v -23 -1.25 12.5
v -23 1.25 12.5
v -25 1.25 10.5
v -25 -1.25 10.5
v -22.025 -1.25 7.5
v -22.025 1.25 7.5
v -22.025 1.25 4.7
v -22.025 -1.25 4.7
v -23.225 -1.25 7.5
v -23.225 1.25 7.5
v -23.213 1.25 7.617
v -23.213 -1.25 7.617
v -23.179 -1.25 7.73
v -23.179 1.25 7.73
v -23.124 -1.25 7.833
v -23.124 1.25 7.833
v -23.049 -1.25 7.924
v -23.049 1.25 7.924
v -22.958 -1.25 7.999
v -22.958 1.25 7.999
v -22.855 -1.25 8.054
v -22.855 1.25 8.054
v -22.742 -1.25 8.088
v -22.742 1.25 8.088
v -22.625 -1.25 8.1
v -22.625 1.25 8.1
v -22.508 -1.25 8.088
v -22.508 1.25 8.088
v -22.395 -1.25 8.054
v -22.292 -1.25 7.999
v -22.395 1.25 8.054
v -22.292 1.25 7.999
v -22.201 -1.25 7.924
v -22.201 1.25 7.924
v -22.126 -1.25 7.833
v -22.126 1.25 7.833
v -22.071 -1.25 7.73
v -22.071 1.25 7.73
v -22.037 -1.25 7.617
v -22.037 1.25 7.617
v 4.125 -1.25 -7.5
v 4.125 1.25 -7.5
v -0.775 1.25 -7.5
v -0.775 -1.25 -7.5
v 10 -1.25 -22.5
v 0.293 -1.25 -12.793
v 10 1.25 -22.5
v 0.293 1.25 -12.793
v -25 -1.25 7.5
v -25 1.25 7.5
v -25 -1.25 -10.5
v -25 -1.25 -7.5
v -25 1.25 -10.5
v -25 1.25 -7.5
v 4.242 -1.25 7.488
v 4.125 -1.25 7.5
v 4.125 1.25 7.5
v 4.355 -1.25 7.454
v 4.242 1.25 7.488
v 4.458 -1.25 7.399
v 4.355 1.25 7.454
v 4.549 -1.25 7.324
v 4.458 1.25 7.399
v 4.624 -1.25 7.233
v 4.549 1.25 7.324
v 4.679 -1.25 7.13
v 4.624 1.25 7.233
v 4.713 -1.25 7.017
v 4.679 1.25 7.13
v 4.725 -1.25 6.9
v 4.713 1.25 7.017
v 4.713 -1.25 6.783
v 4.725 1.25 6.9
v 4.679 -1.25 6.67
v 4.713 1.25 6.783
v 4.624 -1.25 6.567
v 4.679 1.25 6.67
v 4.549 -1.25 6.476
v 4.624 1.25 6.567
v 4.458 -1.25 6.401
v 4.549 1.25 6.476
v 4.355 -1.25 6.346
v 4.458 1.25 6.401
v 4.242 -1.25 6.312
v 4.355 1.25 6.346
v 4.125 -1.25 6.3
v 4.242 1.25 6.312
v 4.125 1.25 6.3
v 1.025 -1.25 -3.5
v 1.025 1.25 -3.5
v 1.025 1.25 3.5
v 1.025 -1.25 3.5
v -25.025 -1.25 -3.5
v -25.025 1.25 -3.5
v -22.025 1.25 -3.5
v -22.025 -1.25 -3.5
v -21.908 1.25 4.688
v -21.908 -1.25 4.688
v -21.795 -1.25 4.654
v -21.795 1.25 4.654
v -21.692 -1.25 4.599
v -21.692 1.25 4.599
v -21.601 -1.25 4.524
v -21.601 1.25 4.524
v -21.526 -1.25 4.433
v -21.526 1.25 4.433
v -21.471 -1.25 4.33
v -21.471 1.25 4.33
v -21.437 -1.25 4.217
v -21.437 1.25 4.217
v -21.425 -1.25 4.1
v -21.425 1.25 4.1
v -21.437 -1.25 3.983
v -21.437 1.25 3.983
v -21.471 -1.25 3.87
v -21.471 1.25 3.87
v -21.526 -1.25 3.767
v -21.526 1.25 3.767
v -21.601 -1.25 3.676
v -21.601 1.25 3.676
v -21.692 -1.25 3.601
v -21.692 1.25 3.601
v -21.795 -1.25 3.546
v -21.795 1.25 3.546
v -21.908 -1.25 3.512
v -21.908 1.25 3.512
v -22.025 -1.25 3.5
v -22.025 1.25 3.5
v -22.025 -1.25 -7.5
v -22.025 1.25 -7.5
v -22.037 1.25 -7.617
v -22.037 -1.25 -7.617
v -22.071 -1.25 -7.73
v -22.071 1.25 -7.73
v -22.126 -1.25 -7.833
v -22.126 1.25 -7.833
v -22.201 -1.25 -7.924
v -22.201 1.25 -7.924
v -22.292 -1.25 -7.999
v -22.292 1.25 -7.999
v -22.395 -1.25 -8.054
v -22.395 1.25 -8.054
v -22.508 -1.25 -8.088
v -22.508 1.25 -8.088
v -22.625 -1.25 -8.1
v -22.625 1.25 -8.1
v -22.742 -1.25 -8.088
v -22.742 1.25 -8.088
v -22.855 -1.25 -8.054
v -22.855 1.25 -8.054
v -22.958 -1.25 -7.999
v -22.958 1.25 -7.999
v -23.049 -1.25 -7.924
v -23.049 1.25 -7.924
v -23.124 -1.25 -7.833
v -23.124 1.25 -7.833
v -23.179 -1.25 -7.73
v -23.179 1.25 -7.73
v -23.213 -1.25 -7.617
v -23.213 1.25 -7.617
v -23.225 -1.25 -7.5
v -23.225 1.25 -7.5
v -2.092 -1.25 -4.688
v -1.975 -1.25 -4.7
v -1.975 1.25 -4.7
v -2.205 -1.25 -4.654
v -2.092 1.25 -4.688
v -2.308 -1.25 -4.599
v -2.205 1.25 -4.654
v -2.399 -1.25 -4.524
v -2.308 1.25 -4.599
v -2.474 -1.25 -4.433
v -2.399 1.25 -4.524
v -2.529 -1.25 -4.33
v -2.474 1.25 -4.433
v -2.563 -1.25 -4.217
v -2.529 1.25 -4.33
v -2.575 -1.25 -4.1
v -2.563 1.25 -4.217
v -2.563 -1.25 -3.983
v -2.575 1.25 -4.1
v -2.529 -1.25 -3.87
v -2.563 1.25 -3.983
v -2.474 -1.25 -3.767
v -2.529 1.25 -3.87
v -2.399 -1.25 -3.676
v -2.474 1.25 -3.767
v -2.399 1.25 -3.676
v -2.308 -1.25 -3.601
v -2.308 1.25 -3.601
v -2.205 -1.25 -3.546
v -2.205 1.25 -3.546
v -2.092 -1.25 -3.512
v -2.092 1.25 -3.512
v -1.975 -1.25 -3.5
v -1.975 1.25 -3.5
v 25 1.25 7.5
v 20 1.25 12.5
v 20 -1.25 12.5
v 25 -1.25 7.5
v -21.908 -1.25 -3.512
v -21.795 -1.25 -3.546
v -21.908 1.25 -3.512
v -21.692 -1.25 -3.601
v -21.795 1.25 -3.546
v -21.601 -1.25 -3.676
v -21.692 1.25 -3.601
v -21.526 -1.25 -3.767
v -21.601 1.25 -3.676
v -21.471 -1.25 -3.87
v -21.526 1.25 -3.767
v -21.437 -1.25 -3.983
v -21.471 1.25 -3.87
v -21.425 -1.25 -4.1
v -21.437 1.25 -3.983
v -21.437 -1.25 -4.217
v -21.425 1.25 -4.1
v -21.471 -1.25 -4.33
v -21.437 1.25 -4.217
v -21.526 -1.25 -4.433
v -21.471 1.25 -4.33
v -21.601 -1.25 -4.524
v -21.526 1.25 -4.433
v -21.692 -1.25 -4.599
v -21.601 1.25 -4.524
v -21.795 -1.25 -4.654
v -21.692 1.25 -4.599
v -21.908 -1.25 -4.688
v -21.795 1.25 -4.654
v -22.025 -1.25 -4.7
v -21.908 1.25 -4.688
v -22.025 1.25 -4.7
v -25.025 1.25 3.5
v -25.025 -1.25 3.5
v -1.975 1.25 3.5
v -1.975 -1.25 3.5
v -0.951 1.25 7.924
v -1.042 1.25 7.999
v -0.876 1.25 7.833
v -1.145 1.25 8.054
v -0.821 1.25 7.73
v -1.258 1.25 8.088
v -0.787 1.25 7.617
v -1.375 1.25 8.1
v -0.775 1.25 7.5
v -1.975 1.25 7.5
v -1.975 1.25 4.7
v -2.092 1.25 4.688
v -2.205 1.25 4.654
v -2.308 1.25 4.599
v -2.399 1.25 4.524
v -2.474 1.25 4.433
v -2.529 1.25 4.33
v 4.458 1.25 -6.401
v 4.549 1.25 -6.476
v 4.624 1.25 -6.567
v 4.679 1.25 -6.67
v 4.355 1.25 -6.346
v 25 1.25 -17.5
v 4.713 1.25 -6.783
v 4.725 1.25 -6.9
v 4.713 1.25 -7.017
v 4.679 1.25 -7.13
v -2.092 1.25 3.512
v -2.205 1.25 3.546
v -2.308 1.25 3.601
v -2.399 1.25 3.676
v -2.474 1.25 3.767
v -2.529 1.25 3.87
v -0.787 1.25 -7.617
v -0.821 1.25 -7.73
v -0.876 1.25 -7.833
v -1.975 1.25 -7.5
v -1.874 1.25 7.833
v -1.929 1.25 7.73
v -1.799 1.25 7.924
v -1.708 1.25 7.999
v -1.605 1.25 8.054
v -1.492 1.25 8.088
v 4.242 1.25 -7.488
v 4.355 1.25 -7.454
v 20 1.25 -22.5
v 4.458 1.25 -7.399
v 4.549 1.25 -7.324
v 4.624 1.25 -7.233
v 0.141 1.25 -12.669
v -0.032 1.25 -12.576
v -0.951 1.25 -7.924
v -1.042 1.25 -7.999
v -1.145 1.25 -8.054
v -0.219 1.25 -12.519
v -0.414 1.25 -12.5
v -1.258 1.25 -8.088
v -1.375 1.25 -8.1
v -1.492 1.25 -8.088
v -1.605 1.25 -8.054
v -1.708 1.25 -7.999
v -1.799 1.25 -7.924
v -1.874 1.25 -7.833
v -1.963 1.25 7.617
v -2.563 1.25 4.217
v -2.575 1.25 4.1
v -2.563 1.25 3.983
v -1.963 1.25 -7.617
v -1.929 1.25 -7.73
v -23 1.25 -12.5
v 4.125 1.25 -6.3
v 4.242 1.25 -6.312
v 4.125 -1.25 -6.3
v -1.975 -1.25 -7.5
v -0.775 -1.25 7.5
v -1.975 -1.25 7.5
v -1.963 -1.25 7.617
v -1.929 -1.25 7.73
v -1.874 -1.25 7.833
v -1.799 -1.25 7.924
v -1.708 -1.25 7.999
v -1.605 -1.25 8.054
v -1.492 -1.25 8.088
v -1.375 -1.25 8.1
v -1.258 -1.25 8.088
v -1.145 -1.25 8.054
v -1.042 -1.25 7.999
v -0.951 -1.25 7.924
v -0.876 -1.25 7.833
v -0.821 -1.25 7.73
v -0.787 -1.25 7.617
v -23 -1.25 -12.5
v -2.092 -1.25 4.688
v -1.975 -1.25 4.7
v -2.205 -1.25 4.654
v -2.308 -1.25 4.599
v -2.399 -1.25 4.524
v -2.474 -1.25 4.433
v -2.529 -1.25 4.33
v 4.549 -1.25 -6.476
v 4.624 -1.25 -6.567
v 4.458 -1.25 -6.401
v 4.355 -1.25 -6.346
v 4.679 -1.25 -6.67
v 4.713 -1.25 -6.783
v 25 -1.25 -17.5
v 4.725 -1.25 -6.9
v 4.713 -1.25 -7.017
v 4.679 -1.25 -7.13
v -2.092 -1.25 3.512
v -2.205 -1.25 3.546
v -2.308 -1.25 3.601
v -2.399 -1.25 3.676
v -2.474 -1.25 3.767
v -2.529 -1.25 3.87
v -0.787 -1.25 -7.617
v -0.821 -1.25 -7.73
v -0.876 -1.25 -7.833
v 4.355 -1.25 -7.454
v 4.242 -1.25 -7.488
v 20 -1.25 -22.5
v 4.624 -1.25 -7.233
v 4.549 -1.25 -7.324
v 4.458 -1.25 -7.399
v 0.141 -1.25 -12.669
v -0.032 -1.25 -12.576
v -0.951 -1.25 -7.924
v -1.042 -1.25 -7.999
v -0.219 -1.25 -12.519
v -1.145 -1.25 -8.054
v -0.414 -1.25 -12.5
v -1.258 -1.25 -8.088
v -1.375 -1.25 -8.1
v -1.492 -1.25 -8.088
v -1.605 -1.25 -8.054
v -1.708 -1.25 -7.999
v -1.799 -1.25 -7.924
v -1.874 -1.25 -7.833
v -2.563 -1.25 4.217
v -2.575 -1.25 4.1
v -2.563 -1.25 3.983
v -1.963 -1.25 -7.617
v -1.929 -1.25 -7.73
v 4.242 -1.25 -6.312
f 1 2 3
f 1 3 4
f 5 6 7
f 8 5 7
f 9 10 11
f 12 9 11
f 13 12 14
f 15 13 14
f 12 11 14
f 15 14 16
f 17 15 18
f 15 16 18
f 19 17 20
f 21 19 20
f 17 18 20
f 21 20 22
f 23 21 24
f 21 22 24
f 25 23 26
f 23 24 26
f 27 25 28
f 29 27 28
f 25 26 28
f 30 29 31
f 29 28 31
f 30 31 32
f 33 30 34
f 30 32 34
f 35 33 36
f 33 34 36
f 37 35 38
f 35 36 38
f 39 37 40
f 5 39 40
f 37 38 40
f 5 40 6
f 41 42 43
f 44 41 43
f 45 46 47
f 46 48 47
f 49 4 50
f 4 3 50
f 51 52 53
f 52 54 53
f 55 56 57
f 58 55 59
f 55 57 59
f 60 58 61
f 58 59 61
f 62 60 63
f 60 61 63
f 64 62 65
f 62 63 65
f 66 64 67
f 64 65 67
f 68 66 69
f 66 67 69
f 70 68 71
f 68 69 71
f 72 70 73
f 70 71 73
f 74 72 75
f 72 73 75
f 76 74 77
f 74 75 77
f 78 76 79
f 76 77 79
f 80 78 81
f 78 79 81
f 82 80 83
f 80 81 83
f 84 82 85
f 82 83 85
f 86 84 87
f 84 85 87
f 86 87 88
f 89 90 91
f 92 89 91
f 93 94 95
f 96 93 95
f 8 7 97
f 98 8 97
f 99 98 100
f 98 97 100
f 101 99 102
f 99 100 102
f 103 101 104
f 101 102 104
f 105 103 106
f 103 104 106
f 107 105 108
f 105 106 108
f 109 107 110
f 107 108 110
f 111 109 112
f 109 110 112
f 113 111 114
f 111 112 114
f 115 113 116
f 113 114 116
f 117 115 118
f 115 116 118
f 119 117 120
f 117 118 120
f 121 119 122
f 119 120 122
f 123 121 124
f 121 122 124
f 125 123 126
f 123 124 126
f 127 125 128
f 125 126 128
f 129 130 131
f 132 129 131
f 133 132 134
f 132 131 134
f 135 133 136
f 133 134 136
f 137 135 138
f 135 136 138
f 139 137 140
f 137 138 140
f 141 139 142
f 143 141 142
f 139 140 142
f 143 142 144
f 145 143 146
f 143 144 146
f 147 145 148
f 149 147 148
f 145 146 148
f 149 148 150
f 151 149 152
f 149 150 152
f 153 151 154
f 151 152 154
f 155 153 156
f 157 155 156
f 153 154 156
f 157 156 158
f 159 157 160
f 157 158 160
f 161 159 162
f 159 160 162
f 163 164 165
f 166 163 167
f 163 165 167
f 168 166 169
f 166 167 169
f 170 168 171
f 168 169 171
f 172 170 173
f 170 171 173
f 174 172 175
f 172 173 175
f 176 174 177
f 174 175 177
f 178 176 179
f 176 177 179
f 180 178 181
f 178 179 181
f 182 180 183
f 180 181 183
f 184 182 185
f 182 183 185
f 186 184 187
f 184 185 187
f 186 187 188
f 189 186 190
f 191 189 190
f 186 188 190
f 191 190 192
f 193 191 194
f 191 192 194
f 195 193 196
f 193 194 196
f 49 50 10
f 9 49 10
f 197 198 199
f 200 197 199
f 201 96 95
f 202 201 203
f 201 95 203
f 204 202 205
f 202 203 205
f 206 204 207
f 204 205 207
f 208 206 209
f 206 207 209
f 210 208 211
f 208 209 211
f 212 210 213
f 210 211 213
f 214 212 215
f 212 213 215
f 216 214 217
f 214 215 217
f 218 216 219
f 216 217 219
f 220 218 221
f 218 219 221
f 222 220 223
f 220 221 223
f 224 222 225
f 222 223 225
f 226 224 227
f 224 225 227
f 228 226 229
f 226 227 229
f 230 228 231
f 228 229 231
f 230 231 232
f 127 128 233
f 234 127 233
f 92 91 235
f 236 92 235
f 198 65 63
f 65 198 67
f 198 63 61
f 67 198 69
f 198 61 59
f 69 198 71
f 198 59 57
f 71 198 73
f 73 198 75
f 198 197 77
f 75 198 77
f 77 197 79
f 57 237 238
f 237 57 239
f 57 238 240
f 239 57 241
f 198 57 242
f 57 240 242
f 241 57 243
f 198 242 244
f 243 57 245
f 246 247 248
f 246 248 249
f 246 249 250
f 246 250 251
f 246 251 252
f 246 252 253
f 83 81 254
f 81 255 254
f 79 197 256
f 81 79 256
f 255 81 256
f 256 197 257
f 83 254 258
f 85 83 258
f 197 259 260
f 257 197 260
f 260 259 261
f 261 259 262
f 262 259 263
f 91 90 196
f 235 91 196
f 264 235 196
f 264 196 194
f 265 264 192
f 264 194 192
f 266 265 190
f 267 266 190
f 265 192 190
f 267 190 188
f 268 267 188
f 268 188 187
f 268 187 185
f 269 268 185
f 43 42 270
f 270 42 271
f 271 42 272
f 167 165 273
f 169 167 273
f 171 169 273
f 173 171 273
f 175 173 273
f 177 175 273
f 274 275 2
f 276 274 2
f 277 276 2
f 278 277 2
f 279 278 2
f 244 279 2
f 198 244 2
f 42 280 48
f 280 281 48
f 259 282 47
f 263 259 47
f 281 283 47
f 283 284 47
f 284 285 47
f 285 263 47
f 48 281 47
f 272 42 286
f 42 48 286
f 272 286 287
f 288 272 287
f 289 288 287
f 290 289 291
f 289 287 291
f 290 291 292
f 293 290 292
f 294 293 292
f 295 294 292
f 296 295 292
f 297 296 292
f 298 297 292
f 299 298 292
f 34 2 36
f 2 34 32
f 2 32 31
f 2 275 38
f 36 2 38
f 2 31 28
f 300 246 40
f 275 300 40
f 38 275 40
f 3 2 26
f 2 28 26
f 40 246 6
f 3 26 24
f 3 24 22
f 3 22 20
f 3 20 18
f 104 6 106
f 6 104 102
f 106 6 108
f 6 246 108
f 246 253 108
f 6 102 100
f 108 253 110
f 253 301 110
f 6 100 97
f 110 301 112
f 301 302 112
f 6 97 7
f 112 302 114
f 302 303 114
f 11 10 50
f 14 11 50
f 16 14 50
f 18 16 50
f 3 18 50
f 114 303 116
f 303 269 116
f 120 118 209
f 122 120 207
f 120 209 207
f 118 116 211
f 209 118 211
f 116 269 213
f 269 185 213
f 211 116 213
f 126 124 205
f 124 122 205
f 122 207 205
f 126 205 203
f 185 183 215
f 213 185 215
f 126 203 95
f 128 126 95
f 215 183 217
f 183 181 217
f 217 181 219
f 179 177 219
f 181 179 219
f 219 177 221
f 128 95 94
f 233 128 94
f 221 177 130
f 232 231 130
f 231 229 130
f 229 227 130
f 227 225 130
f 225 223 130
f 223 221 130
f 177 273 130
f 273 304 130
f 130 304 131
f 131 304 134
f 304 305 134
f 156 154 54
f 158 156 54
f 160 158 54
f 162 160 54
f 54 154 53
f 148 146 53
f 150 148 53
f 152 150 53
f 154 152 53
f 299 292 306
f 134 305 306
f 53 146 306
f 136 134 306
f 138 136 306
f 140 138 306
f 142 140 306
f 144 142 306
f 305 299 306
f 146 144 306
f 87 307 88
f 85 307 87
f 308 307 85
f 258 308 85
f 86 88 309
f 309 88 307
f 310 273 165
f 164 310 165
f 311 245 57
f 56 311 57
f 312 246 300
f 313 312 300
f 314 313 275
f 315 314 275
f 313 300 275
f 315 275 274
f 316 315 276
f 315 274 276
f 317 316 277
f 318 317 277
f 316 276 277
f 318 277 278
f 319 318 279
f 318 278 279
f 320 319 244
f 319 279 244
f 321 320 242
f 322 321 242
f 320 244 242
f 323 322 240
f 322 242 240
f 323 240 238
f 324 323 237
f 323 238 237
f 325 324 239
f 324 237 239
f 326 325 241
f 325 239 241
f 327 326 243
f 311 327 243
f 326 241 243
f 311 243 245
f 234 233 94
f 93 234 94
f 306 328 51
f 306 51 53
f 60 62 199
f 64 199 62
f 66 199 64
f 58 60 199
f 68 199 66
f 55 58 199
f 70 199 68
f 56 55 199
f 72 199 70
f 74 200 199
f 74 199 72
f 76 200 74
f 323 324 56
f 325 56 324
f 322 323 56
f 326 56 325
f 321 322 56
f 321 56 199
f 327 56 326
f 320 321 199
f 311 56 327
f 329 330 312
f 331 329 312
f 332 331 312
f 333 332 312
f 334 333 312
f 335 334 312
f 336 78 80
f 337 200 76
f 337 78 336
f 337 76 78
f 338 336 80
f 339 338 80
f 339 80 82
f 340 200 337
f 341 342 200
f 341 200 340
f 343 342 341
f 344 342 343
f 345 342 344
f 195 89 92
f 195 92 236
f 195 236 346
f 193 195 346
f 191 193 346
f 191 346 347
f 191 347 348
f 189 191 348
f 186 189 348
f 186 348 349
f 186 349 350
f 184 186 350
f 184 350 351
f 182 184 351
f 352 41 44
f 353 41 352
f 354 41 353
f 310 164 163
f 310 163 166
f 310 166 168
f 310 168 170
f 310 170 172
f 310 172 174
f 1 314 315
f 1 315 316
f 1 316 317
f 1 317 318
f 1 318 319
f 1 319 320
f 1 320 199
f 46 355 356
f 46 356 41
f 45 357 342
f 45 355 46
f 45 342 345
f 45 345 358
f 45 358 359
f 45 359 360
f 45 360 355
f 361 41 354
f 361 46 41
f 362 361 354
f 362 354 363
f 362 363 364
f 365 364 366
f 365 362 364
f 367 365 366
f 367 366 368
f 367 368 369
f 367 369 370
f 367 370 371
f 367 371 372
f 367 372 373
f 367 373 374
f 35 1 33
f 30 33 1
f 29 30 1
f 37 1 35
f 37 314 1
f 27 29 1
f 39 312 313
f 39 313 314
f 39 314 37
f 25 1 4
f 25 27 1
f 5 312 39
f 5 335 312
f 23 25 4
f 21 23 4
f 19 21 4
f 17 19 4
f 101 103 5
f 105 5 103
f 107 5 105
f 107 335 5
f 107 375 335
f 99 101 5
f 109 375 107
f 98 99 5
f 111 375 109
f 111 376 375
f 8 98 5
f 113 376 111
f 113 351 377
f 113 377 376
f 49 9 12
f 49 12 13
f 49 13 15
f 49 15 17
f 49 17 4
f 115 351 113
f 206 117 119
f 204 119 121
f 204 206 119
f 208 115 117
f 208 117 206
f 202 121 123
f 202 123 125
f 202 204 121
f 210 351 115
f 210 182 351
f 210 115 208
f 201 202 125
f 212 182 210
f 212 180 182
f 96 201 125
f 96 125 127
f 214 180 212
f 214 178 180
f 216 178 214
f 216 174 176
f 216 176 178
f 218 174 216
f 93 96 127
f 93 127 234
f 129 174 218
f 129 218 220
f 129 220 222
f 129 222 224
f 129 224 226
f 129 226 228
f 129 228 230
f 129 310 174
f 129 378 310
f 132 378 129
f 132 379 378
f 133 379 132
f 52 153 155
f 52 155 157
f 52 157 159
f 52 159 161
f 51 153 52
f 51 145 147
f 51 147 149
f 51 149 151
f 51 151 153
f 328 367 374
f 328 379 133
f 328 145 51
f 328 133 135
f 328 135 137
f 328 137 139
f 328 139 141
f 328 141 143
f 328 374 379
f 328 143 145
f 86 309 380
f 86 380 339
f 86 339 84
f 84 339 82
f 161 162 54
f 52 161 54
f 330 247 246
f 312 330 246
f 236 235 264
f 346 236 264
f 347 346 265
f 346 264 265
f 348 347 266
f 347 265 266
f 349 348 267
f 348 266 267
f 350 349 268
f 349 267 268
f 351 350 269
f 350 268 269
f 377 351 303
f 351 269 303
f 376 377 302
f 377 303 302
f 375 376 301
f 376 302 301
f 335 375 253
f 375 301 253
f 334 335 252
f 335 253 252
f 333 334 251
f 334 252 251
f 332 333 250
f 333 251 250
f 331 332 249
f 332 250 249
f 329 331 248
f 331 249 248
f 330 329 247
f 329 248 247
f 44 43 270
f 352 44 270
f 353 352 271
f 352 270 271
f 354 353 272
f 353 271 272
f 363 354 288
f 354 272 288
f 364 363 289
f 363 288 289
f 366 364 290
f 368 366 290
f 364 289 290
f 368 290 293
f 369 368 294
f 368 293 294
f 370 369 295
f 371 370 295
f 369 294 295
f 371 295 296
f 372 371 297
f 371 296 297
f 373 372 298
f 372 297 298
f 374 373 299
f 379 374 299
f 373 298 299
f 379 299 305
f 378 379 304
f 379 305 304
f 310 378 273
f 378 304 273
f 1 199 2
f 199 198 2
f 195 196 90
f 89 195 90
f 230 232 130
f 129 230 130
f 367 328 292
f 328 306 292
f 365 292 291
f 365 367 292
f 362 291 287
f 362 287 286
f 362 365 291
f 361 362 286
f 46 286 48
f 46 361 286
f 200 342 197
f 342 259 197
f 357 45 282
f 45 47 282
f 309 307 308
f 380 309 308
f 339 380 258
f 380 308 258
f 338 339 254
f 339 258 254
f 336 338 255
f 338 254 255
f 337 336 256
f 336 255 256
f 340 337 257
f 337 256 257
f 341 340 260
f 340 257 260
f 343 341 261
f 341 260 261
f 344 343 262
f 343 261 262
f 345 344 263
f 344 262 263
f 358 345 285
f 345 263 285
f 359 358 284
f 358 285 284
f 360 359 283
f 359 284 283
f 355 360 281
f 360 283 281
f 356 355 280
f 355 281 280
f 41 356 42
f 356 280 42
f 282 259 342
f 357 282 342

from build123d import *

# Parameters (mm, degrees)
EXTRUDE_1_DEPTH     = 1.25
SKETCH_2_R          = 0.6
CUT_EXTRUDE_1_DEPTH = 3.5
CHAMFER_2_SIZE      = 2
FILLET_1_R          = 1
CHAMFER_3_SIZE      = 5


with BuildPart() as part:
    # 草图1 → 凸台-拉伸1 (new body, symmetric)
    with BuildSketch(Plane(origin=(0, 0, 0), x_dir=(1, 0, 0), z_dir=(0, 1, 0))):
        Polygon((-25, 12.5), (0, 12.5), (10, 22.5), (25, 22.5), (25, -12.5), (-25, -12.5), (-25, -7.5), (-22.025, -7.5), (-22.025, -3.5), (-25.025, -3.5), (-25.025, 3.5), (-22.025, 3.5), (-22.025, 7.5), (-25, 7.5), align=None)
        Polygon((-1.975, -3.5), (-1.975, -7.5), (4.125, -7.5), (4.125, 7.5), (-1.975, 7.5), (-1.975, 3.5), (1.025, 3.5), (1.025, -3.5), align=None, mode=Mode.SUBTRACT)
    extrude(amount=EXTRUDE_1_DEPTH, both=True)

    # 草图2 → 切除-拉伸1 (cut, through all)
    with BuildSketch(Plane(origin=(0, 1.25, 0), x_dir=(1, 0, 0), z_dir=(0, 1, 0))):
        with Locations((-22.025, 4.1)):
            Circle(SKETCH_2_R)
        with Locations((-22.625, 7.5)):
            Circle(SKETCH_2_R)
        with Locations((-22.625, -7.5)):
            Circle(SKETCH_2_R)
        with Locations((-22.025, -4.1)):
            Circle(SKETCH_2_R)
        with Locations((-1.975, 4.1)):
            Circle(SKETCH_2_R)
        with Locations((-1.375, 7.5)):
            Circle(SKETCH_2_R)
        with Locations((-1.375, -7.5)):
            Circle(SKETCH_2_R)
        with Locations((-1.975, -4.1)):
            Circle(SKETCH_2_R)
        with Locations((4.125, -6.9)):
            Circle(SKETCH_2_R)
        with Locations((4.125, 6.9)):
            Circle(SKETCH_2_R)
    extrude(amount=-CUT_EXTRUDE_1_DEPTH, mode=Mode.SUBTRACT)

    # 倒角2
    chamfer_2_edges = [part.edges().sort_by_distance(p)[0] for p in [
        (-25, 0, -12.5),
        (-25, 0, 12.5),
    ]]
    chamfer(chamfer_2_edges, length=CHAMFER_2_SIZE)

    # 圆角1
    fillet_1_edges = [part.edges().sort_by_distance(p)[0] for p in [
        (0, 0, -12.5),
    ]]
    fillet(fillet_1_edges, radius=FILLET_1_R)

    # 倒角3
    chamfer_3_edges = [part.edges().sort_by_distance(p)[0] for p in [
        (25, 0, -22.5),
        (25, 0, 12.5),
    ]]
    chamfer(chamfer_3_edges, length=CHAMFER_3_SIZE)


solid = part.part
